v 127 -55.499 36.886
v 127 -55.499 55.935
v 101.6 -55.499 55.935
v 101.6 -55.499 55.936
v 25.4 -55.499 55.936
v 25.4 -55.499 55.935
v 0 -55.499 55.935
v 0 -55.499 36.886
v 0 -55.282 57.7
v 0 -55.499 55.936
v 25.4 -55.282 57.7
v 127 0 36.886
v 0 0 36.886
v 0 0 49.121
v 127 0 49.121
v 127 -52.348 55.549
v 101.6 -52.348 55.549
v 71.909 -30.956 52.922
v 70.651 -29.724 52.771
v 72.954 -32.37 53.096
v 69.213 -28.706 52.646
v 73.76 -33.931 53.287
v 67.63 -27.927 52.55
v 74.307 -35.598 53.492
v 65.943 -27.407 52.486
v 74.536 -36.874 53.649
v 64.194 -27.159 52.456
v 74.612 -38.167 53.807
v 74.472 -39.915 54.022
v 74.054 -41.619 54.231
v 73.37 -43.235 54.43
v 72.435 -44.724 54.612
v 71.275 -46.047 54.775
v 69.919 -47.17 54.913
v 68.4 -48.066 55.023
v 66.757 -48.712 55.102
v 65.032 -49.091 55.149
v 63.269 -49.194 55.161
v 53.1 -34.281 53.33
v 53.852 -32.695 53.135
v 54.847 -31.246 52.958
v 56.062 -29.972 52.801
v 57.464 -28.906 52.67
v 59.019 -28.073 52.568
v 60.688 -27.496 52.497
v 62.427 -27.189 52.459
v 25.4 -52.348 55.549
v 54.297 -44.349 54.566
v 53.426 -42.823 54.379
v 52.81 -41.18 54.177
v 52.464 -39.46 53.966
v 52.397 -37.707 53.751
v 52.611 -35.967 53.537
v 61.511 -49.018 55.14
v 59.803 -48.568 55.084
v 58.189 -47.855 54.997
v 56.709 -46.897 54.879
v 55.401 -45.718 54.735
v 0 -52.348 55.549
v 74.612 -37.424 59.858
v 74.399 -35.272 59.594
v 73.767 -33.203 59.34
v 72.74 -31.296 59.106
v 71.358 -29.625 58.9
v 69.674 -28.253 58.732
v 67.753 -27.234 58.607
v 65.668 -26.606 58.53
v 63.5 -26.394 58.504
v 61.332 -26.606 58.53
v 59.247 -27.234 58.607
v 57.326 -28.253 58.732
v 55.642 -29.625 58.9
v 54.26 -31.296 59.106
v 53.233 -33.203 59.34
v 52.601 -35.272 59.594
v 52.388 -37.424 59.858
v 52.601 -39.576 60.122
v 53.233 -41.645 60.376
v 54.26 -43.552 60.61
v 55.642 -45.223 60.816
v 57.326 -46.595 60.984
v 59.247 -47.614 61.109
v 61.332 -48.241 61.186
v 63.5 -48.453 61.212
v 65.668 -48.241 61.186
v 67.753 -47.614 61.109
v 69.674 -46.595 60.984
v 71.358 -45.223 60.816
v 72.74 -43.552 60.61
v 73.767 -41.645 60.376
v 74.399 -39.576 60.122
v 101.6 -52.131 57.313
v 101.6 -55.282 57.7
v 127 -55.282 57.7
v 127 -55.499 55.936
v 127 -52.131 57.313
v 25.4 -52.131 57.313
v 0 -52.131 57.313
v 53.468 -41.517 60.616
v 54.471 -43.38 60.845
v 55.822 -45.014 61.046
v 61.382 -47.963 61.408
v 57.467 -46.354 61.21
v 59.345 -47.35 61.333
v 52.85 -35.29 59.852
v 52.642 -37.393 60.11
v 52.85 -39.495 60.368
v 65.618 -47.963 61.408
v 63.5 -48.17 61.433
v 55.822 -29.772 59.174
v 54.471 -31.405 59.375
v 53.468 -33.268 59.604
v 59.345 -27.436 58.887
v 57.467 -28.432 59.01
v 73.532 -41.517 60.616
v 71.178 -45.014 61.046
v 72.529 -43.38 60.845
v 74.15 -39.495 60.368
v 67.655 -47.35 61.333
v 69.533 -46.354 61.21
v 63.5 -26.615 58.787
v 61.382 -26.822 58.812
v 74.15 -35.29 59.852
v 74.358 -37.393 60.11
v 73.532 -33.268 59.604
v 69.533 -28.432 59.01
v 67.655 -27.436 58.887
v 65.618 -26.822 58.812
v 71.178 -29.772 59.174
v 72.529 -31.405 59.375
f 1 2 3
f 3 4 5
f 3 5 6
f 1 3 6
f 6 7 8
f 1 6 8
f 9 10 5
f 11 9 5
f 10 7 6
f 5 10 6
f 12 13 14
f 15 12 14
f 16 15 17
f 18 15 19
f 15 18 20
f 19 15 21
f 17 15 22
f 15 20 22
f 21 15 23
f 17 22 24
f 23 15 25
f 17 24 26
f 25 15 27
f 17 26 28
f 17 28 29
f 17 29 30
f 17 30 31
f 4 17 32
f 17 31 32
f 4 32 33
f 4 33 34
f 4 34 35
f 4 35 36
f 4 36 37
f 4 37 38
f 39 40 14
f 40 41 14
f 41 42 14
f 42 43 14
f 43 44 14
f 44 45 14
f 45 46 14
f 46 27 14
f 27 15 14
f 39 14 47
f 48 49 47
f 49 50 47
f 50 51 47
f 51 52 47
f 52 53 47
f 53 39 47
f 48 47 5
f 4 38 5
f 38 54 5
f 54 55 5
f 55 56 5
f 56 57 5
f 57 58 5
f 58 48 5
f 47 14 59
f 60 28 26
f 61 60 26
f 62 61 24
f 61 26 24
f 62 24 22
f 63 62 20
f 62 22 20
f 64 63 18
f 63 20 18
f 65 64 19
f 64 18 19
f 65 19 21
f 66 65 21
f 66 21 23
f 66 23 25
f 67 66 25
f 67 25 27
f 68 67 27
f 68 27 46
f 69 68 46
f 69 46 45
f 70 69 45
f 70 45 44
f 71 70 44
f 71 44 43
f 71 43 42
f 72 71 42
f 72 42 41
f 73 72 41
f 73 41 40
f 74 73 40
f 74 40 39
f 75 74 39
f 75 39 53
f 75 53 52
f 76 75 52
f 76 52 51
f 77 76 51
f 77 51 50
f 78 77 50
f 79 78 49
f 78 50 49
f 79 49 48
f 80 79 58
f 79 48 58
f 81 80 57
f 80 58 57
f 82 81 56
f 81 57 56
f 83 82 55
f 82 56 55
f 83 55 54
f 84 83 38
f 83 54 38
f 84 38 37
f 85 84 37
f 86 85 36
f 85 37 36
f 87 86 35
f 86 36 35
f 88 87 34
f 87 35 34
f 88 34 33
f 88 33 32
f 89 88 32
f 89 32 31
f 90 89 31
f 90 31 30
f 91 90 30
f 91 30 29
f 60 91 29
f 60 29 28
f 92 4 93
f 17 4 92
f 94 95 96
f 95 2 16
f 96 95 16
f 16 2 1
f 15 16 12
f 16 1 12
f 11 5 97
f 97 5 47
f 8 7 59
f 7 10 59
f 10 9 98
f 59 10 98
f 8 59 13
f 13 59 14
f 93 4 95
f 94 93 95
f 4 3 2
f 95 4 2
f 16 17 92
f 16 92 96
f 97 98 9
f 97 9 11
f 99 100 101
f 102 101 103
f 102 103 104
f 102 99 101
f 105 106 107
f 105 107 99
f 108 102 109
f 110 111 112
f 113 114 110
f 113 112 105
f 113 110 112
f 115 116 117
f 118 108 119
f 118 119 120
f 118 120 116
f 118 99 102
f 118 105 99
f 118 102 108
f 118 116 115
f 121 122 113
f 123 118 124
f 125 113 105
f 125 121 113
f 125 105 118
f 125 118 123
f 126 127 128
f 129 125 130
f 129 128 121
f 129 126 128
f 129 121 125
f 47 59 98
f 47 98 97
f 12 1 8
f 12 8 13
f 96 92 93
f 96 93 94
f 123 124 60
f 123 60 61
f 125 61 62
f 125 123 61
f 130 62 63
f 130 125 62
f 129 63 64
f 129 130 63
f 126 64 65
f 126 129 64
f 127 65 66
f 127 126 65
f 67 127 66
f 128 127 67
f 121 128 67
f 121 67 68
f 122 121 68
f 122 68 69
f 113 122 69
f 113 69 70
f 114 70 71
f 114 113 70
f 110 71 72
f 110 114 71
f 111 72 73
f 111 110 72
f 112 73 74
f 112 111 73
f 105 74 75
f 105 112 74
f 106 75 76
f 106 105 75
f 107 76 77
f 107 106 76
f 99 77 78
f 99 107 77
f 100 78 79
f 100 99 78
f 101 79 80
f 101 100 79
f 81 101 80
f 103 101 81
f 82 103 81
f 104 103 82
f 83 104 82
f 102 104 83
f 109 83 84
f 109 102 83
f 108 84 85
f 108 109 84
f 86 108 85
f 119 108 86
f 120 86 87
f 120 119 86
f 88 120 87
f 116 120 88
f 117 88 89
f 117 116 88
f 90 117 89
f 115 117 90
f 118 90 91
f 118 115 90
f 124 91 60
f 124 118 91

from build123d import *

# Parameters (mm, degrees)
F1_DEPTH = 127
F2_R     = 11.1125
F3_DEPTH = 6.35
F4_SIZE  = 0.254
F2_W     = 25.4
F2_H     = 3.175
F5_DEPTH = 1.778


with BuildPart() as f1:
    # F0 (on Right) → F1 (new body)
    with BuildSketch(Plane.YZ):
        Polygon((-55.499, 36.88551), (0, 36.88551), (0, 49.121089), (-55.499, 55.93551), align=None)
    extrude(amount=F1_DEPTH)

    # F2 (on face) → F3 (join)
    with BuildSketch(Plane(origin=(0, 5.941734, 48.391536), x_dir=(1, 0, 0), z_dir=(0, 0.121869, 0.992546))):
        with Locations((63.5, -44.439643)):
            Circle(F2_R)
    extrude(amount=F3_DEPTH)

    # F4
    f4_edges = [f1.edges().sort_by_distance(p)[0] for p in [
        (52.3875, -37.392792, 60.110034),
    ]]
    chamfer(f4_edges, length=F4_SIZE)

    # F2 (on face) → F5 (join)
    with BuildSketch(Plane(origin=(0, 5.941734, 48.391536), x_dir=(1, 0, 0), z_dir=(0, 0.121869, 0.992546))):
        with Locations((114.3, -60.314643)):
            Rectangle(F2_W, F2_H)
        with Locations((12.7, -60.314643)):
            Rectangle(F2_W, F2_H)
    extrude(amount=F5_DEPTH)


solid = f1.part
